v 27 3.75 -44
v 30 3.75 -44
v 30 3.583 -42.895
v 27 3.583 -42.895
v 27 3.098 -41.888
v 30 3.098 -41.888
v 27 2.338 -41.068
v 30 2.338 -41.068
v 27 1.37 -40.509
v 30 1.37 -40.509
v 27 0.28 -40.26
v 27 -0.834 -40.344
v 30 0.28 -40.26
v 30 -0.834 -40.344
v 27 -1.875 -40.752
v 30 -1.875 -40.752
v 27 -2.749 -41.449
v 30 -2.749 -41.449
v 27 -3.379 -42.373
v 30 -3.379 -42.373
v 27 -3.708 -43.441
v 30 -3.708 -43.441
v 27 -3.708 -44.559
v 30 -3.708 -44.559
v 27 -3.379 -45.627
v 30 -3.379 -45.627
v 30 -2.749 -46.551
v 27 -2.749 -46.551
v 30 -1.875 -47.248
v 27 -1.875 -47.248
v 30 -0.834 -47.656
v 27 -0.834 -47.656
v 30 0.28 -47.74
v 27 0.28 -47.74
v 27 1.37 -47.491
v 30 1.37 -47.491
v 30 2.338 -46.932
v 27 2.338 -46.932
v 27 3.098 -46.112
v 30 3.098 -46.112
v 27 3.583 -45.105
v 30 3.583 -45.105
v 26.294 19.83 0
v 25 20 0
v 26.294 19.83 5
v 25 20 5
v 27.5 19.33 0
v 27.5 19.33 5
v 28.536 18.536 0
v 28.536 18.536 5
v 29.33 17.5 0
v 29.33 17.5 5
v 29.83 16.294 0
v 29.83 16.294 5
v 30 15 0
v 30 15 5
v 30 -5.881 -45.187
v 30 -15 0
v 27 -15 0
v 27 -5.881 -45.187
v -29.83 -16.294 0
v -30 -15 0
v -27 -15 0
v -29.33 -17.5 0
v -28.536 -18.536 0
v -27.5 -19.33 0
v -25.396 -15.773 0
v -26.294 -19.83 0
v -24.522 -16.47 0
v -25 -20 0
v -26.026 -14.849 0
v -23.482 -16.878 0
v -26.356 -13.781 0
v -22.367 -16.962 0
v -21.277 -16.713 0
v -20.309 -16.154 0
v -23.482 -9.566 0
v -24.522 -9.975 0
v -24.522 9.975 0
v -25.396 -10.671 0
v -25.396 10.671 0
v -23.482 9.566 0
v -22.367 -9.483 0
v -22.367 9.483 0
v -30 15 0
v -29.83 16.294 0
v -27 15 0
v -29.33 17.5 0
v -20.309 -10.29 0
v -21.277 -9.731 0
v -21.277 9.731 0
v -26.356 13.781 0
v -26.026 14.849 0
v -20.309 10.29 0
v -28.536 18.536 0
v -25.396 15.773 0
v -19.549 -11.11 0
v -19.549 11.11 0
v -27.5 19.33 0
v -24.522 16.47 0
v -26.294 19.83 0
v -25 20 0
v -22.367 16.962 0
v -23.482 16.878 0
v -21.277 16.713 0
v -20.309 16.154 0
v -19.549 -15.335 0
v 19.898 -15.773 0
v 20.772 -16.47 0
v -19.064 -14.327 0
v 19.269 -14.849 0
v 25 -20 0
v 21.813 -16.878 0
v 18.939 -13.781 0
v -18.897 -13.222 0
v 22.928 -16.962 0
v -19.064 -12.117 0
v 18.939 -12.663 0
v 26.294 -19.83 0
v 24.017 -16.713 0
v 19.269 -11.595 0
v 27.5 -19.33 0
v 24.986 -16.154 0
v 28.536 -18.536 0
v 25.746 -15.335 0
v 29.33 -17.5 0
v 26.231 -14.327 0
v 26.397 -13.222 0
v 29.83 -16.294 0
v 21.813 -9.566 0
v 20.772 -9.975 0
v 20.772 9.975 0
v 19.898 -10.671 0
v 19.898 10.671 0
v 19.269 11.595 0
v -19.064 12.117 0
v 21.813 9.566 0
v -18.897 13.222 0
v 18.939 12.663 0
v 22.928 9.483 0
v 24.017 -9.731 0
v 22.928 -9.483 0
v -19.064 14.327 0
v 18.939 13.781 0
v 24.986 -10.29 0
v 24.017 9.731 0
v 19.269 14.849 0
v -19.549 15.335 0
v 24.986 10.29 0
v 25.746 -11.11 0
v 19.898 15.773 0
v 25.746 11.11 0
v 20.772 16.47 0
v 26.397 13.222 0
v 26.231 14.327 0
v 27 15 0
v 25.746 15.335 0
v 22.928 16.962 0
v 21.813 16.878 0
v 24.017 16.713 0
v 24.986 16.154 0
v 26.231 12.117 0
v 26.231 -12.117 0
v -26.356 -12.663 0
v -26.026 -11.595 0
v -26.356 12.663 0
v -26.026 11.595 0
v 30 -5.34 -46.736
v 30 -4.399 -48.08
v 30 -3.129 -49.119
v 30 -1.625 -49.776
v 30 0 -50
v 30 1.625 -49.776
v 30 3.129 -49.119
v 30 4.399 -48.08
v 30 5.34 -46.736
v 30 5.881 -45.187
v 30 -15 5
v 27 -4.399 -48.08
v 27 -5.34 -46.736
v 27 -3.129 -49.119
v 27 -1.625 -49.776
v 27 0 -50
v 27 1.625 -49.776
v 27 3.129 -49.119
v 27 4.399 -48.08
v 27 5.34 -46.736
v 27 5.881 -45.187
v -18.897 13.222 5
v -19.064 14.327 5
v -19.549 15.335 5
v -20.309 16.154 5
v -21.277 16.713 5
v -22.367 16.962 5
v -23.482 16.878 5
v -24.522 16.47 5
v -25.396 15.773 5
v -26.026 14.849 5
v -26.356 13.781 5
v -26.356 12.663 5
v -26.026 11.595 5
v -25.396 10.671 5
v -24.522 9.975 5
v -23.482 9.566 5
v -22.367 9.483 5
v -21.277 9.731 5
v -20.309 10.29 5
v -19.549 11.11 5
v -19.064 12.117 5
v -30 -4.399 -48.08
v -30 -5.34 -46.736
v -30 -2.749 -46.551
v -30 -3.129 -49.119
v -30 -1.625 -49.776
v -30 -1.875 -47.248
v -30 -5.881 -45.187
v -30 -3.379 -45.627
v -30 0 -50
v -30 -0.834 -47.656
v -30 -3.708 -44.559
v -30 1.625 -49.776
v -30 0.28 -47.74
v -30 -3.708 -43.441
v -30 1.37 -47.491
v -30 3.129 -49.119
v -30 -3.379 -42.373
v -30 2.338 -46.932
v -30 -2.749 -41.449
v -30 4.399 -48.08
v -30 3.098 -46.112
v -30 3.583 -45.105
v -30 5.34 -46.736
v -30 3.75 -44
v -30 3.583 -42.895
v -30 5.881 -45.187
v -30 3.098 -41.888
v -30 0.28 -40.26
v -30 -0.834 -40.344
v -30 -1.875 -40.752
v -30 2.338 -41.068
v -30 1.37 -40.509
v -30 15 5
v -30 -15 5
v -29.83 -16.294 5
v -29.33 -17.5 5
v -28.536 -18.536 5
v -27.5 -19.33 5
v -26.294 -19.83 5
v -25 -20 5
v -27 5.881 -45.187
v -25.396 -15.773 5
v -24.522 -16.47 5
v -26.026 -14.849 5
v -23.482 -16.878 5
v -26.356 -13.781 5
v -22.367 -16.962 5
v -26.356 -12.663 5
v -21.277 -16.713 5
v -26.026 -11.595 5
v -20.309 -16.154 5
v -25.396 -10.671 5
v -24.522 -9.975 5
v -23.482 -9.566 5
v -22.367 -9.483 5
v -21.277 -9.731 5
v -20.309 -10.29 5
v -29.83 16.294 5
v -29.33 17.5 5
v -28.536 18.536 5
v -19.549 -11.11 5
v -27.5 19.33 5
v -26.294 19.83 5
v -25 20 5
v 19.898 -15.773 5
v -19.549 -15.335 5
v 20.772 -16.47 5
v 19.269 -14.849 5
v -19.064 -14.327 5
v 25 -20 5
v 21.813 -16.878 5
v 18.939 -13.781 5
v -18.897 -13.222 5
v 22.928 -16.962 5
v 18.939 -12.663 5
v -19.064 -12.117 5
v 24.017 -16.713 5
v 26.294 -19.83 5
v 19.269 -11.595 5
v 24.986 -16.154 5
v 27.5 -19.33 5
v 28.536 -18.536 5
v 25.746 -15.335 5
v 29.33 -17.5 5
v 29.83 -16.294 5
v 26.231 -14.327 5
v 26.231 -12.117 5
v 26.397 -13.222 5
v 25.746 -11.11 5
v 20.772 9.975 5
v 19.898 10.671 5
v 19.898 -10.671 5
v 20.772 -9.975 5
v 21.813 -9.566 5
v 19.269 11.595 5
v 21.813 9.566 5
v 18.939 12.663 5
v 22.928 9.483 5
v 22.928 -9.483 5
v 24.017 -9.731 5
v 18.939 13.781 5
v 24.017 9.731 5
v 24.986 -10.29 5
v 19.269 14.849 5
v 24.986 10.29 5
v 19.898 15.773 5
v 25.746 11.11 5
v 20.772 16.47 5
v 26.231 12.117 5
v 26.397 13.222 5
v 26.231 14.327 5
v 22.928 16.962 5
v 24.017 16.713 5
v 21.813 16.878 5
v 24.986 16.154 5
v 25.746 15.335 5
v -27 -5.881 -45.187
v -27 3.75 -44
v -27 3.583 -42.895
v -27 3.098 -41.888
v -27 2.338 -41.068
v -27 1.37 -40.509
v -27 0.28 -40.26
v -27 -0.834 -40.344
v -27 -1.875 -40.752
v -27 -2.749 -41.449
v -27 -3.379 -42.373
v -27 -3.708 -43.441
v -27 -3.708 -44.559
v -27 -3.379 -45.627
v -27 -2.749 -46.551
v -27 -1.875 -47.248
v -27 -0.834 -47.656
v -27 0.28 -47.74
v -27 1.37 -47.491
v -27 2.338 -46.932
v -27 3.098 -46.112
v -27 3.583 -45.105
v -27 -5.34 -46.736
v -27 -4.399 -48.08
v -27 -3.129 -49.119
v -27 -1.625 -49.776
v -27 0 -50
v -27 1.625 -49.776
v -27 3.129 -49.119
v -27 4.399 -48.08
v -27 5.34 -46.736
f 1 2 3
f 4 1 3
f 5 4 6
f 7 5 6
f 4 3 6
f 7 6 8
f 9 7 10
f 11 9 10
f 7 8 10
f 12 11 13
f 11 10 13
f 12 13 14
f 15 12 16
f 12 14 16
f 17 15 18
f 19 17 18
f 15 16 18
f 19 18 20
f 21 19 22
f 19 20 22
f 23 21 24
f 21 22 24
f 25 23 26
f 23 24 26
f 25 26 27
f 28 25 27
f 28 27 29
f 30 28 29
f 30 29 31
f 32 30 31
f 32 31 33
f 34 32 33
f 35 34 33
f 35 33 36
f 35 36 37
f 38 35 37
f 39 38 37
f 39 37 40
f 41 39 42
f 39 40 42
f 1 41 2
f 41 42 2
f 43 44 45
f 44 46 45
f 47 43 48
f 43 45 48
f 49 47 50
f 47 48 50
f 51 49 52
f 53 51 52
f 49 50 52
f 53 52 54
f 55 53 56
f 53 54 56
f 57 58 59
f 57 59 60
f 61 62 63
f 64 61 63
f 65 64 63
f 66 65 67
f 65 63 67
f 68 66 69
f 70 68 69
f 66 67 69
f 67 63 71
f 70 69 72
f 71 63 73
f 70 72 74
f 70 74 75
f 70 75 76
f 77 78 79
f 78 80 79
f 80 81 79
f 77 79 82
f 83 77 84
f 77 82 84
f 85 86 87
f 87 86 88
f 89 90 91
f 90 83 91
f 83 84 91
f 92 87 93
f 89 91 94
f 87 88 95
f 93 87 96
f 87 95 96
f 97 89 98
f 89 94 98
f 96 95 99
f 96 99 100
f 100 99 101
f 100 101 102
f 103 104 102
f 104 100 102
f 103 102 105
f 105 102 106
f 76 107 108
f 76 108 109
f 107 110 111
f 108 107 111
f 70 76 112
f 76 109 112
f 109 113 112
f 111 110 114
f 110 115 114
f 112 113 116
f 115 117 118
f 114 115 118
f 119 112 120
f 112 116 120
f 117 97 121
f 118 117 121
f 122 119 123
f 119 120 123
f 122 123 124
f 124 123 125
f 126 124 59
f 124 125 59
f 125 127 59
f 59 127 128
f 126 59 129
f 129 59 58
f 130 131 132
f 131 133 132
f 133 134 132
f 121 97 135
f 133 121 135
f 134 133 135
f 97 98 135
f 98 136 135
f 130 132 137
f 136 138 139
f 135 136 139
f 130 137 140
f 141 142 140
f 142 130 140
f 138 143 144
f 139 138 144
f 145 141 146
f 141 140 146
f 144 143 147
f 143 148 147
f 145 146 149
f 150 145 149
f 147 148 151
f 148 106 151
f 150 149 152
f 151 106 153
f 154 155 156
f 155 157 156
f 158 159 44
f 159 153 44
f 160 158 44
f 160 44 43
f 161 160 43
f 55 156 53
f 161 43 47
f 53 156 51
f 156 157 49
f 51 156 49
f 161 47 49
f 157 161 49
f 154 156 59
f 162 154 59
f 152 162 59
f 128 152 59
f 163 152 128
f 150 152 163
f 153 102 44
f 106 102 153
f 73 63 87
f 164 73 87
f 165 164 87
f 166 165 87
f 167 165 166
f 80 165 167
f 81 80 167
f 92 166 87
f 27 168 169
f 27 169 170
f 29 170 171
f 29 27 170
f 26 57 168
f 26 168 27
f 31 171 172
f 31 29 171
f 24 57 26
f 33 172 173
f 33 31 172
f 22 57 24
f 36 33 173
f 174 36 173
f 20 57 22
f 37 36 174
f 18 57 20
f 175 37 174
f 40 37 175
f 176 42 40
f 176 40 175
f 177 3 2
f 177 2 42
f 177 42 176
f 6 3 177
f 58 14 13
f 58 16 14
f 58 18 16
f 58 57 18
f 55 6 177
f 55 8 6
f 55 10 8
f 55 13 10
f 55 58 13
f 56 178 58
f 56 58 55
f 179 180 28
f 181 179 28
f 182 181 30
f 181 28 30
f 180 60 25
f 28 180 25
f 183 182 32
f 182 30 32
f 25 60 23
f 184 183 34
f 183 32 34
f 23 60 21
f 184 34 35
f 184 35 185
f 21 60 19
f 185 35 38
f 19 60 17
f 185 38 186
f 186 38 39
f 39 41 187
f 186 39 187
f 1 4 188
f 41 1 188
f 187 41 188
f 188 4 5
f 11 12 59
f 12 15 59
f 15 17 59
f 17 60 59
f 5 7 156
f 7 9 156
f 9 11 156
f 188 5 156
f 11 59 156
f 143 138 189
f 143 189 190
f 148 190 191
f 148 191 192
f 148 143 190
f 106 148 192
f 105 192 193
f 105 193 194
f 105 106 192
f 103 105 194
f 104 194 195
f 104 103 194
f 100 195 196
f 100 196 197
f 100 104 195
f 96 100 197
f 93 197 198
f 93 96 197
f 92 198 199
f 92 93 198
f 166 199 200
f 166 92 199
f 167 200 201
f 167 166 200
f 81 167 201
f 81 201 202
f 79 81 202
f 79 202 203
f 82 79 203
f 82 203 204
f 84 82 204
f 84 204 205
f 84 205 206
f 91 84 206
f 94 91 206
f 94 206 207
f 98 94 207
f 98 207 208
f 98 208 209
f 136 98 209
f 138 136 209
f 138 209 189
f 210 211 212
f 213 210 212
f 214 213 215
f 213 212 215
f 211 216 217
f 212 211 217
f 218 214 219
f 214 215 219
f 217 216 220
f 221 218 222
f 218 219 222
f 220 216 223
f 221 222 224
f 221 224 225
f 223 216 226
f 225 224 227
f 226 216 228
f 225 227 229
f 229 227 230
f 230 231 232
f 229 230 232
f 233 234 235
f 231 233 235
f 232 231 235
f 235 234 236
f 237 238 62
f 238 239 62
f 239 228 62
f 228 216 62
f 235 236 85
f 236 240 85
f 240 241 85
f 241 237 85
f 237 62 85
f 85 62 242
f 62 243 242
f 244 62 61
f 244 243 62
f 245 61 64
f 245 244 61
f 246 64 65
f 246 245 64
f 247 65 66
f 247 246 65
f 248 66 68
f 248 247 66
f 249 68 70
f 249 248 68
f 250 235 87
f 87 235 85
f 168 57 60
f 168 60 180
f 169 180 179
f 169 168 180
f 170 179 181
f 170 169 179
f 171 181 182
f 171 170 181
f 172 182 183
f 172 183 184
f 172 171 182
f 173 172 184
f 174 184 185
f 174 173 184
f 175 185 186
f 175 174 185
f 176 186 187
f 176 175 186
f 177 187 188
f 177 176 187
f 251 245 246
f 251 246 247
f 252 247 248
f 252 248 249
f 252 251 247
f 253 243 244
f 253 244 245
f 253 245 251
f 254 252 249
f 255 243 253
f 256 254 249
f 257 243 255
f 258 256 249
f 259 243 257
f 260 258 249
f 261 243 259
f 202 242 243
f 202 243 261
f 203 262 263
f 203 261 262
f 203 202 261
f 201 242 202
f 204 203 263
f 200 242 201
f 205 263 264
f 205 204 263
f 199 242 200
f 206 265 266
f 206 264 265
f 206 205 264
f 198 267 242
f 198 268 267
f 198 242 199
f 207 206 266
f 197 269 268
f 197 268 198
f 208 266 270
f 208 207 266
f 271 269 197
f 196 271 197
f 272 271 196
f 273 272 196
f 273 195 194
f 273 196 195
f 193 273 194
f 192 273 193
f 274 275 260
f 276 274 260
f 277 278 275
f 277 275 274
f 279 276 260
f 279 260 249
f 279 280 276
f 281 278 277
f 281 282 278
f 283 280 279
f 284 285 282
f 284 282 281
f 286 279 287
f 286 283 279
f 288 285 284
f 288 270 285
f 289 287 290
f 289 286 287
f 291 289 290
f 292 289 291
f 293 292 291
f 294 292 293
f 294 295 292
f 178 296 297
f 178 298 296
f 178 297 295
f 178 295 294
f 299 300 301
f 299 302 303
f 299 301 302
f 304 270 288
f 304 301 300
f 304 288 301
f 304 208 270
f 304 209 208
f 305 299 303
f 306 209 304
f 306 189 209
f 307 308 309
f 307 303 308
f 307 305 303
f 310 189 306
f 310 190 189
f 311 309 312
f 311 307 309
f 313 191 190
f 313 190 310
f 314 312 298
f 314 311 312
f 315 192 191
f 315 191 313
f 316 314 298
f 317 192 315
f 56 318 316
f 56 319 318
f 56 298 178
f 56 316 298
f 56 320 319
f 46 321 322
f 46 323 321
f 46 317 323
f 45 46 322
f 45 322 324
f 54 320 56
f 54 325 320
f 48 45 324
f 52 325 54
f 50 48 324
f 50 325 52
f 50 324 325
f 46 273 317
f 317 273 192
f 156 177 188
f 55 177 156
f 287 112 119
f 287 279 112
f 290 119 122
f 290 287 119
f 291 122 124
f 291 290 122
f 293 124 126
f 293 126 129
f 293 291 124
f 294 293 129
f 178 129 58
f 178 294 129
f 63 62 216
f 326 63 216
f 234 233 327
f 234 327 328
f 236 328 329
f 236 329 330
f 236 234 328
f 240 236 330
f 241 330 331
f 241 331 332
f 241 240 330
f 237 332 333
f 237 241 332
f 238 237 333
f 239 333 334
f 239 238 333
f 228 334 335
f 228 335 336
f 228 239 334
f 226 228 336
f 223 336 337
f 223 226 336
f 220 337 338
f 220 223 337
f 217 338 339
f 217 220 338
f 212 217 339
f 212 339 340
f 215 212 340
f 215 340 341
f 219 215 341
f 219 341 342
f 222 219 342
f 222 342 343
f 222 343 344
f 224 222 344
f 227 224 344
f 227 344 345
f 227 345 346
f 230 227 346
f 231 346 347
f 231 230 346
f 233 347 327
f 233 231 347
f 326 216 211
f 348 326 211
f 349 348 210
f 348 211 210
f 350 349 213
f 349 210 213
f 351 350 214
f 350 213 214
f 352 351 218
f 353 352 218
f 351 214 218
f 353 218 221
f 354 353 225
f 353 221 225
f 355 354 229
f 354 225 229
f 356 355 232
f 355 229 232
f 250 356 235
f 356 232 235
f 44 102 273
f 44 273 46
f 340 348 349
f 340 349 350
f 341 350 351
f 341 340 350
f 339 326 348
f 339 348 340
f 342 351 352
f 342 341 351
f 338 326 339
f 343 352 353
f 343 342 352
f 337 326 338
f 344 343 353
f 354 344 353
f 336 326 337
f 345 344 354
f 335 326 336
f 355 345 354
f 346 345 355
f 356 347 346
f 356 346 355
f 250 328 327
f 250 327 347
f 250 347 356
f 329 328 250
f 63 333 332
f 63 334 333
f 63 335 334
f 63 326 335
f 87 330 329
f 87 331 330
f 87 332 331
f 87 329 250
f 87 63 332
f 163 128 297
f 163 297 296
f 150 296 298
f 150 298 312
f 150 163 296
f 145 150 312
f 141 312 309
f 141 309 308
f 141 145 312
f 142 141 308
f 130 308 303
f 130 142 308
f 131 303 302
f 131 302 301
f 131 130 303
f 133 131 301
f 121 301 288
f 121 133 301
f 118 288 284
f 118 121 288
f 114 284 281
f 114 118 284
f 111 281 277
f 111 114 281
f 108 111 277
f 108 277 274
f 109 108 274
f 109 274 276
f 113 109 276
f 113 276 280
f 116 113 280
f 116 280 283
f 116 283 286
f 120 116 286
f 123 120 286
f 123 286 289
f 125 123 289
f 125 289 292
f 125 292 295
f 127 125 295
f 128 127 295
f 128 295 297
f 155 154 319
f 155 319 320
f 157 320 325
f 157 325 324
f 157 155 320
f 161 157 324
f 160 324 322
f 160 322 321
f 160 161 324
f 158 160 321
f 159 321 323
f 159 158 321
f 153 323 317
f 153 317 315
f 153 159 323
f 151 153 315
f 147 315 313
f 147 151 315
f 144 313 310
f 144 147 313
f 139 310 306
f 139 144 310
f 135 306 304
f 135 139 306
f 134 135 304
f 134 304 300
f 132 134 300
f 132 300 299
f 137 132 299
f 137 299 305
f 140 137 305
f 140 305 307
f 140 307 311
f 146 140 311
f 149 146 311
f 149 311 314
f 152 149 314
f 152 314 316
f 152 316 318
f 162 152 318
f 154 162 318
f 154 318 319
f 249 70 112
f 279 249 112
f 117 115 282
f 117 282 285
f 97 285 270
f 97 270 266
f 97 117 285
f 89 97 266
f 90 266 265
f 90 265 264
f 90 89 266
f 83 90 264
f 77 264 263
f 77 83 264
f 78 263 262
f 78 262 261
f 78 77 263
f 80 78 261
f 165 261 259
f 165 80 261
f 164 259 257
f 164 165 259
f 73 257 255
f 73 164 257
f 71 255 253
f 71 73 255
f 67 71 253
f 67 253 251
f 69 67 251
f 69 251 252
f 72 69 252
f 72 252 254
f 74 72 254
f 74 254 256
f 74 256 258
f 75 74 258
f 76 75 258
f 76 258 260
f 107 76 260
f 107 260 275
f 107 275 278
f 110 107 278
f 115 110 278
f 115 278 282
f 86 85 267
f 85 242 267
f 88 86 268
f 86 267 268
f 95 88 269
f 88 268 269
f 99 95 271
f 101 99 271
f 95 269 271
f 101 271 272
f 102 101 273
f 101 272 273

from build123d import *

# Parameters (mm, degrees)
F0_W     = 60
F0_H     = 40
F0_R     = 3.75
F1_DEPTH = 5
F2_R     = 5
F3_R     = 3.75
F4_DEPTH = 3


with BuildPart() as f1:
    # F0 (on Top) → F1 (new body)
    with BuildSketch(Plane.XY):
        Rectangle(F0_W, F0_H)
        with Locations((-22.647429, -13.222116)):
            Circle(F0_R, mode=Mode.SUBTRACT)
        with Locations((22.647429, -13.222116)):
            Circle(F0_R, mode=Mode.SUBTRACT)
        with Locations((-22.647429, 13.222116)):
            Circle(F0_R, mode=Mode.SUBTRACT)
        with Locations((22.647429, 13.222116)):
            Circle(F0_R, mode=Mode.SUBTRACT)
    extrude(amount=F1_DEPTH)

    # F2
    f2_edges = [f1.edges().sort_by_distance(p)[0] for p in [
        (-30, -20, 2.5),
        (30, -20, 2.5),
        (30, 20, 2.5),
        (-30, 20, 2.5),
    ]]
    fillet(f2_edges, radius=F2_R)

    # F3 (on face) → F4 (join)
    with BuildSketch(Plane.YZ.offset(30)):
        with BuildLine():
            Line((15, 0), (-15, 0))
            Line((-15, 0), (-5.881443, -45.186856))
            ThreePointArc((-5.881443, -45.186856), (0, -50), (5.881443, -45.186856))
            Line((5.881443, -45.186856), (15, 0))
        make_face()
        with Locations((0, -44)):
            Circle(F3_R, mode=Mode.SUBTRACT)
    extrude(amount=-F4_DEPTH)

    # F5: F1 across plane


with BuildPart() as f1_1:
    add(f1.part)
    add(f1.part.mirror(Plane.YZ))


solid = f1_1.part
